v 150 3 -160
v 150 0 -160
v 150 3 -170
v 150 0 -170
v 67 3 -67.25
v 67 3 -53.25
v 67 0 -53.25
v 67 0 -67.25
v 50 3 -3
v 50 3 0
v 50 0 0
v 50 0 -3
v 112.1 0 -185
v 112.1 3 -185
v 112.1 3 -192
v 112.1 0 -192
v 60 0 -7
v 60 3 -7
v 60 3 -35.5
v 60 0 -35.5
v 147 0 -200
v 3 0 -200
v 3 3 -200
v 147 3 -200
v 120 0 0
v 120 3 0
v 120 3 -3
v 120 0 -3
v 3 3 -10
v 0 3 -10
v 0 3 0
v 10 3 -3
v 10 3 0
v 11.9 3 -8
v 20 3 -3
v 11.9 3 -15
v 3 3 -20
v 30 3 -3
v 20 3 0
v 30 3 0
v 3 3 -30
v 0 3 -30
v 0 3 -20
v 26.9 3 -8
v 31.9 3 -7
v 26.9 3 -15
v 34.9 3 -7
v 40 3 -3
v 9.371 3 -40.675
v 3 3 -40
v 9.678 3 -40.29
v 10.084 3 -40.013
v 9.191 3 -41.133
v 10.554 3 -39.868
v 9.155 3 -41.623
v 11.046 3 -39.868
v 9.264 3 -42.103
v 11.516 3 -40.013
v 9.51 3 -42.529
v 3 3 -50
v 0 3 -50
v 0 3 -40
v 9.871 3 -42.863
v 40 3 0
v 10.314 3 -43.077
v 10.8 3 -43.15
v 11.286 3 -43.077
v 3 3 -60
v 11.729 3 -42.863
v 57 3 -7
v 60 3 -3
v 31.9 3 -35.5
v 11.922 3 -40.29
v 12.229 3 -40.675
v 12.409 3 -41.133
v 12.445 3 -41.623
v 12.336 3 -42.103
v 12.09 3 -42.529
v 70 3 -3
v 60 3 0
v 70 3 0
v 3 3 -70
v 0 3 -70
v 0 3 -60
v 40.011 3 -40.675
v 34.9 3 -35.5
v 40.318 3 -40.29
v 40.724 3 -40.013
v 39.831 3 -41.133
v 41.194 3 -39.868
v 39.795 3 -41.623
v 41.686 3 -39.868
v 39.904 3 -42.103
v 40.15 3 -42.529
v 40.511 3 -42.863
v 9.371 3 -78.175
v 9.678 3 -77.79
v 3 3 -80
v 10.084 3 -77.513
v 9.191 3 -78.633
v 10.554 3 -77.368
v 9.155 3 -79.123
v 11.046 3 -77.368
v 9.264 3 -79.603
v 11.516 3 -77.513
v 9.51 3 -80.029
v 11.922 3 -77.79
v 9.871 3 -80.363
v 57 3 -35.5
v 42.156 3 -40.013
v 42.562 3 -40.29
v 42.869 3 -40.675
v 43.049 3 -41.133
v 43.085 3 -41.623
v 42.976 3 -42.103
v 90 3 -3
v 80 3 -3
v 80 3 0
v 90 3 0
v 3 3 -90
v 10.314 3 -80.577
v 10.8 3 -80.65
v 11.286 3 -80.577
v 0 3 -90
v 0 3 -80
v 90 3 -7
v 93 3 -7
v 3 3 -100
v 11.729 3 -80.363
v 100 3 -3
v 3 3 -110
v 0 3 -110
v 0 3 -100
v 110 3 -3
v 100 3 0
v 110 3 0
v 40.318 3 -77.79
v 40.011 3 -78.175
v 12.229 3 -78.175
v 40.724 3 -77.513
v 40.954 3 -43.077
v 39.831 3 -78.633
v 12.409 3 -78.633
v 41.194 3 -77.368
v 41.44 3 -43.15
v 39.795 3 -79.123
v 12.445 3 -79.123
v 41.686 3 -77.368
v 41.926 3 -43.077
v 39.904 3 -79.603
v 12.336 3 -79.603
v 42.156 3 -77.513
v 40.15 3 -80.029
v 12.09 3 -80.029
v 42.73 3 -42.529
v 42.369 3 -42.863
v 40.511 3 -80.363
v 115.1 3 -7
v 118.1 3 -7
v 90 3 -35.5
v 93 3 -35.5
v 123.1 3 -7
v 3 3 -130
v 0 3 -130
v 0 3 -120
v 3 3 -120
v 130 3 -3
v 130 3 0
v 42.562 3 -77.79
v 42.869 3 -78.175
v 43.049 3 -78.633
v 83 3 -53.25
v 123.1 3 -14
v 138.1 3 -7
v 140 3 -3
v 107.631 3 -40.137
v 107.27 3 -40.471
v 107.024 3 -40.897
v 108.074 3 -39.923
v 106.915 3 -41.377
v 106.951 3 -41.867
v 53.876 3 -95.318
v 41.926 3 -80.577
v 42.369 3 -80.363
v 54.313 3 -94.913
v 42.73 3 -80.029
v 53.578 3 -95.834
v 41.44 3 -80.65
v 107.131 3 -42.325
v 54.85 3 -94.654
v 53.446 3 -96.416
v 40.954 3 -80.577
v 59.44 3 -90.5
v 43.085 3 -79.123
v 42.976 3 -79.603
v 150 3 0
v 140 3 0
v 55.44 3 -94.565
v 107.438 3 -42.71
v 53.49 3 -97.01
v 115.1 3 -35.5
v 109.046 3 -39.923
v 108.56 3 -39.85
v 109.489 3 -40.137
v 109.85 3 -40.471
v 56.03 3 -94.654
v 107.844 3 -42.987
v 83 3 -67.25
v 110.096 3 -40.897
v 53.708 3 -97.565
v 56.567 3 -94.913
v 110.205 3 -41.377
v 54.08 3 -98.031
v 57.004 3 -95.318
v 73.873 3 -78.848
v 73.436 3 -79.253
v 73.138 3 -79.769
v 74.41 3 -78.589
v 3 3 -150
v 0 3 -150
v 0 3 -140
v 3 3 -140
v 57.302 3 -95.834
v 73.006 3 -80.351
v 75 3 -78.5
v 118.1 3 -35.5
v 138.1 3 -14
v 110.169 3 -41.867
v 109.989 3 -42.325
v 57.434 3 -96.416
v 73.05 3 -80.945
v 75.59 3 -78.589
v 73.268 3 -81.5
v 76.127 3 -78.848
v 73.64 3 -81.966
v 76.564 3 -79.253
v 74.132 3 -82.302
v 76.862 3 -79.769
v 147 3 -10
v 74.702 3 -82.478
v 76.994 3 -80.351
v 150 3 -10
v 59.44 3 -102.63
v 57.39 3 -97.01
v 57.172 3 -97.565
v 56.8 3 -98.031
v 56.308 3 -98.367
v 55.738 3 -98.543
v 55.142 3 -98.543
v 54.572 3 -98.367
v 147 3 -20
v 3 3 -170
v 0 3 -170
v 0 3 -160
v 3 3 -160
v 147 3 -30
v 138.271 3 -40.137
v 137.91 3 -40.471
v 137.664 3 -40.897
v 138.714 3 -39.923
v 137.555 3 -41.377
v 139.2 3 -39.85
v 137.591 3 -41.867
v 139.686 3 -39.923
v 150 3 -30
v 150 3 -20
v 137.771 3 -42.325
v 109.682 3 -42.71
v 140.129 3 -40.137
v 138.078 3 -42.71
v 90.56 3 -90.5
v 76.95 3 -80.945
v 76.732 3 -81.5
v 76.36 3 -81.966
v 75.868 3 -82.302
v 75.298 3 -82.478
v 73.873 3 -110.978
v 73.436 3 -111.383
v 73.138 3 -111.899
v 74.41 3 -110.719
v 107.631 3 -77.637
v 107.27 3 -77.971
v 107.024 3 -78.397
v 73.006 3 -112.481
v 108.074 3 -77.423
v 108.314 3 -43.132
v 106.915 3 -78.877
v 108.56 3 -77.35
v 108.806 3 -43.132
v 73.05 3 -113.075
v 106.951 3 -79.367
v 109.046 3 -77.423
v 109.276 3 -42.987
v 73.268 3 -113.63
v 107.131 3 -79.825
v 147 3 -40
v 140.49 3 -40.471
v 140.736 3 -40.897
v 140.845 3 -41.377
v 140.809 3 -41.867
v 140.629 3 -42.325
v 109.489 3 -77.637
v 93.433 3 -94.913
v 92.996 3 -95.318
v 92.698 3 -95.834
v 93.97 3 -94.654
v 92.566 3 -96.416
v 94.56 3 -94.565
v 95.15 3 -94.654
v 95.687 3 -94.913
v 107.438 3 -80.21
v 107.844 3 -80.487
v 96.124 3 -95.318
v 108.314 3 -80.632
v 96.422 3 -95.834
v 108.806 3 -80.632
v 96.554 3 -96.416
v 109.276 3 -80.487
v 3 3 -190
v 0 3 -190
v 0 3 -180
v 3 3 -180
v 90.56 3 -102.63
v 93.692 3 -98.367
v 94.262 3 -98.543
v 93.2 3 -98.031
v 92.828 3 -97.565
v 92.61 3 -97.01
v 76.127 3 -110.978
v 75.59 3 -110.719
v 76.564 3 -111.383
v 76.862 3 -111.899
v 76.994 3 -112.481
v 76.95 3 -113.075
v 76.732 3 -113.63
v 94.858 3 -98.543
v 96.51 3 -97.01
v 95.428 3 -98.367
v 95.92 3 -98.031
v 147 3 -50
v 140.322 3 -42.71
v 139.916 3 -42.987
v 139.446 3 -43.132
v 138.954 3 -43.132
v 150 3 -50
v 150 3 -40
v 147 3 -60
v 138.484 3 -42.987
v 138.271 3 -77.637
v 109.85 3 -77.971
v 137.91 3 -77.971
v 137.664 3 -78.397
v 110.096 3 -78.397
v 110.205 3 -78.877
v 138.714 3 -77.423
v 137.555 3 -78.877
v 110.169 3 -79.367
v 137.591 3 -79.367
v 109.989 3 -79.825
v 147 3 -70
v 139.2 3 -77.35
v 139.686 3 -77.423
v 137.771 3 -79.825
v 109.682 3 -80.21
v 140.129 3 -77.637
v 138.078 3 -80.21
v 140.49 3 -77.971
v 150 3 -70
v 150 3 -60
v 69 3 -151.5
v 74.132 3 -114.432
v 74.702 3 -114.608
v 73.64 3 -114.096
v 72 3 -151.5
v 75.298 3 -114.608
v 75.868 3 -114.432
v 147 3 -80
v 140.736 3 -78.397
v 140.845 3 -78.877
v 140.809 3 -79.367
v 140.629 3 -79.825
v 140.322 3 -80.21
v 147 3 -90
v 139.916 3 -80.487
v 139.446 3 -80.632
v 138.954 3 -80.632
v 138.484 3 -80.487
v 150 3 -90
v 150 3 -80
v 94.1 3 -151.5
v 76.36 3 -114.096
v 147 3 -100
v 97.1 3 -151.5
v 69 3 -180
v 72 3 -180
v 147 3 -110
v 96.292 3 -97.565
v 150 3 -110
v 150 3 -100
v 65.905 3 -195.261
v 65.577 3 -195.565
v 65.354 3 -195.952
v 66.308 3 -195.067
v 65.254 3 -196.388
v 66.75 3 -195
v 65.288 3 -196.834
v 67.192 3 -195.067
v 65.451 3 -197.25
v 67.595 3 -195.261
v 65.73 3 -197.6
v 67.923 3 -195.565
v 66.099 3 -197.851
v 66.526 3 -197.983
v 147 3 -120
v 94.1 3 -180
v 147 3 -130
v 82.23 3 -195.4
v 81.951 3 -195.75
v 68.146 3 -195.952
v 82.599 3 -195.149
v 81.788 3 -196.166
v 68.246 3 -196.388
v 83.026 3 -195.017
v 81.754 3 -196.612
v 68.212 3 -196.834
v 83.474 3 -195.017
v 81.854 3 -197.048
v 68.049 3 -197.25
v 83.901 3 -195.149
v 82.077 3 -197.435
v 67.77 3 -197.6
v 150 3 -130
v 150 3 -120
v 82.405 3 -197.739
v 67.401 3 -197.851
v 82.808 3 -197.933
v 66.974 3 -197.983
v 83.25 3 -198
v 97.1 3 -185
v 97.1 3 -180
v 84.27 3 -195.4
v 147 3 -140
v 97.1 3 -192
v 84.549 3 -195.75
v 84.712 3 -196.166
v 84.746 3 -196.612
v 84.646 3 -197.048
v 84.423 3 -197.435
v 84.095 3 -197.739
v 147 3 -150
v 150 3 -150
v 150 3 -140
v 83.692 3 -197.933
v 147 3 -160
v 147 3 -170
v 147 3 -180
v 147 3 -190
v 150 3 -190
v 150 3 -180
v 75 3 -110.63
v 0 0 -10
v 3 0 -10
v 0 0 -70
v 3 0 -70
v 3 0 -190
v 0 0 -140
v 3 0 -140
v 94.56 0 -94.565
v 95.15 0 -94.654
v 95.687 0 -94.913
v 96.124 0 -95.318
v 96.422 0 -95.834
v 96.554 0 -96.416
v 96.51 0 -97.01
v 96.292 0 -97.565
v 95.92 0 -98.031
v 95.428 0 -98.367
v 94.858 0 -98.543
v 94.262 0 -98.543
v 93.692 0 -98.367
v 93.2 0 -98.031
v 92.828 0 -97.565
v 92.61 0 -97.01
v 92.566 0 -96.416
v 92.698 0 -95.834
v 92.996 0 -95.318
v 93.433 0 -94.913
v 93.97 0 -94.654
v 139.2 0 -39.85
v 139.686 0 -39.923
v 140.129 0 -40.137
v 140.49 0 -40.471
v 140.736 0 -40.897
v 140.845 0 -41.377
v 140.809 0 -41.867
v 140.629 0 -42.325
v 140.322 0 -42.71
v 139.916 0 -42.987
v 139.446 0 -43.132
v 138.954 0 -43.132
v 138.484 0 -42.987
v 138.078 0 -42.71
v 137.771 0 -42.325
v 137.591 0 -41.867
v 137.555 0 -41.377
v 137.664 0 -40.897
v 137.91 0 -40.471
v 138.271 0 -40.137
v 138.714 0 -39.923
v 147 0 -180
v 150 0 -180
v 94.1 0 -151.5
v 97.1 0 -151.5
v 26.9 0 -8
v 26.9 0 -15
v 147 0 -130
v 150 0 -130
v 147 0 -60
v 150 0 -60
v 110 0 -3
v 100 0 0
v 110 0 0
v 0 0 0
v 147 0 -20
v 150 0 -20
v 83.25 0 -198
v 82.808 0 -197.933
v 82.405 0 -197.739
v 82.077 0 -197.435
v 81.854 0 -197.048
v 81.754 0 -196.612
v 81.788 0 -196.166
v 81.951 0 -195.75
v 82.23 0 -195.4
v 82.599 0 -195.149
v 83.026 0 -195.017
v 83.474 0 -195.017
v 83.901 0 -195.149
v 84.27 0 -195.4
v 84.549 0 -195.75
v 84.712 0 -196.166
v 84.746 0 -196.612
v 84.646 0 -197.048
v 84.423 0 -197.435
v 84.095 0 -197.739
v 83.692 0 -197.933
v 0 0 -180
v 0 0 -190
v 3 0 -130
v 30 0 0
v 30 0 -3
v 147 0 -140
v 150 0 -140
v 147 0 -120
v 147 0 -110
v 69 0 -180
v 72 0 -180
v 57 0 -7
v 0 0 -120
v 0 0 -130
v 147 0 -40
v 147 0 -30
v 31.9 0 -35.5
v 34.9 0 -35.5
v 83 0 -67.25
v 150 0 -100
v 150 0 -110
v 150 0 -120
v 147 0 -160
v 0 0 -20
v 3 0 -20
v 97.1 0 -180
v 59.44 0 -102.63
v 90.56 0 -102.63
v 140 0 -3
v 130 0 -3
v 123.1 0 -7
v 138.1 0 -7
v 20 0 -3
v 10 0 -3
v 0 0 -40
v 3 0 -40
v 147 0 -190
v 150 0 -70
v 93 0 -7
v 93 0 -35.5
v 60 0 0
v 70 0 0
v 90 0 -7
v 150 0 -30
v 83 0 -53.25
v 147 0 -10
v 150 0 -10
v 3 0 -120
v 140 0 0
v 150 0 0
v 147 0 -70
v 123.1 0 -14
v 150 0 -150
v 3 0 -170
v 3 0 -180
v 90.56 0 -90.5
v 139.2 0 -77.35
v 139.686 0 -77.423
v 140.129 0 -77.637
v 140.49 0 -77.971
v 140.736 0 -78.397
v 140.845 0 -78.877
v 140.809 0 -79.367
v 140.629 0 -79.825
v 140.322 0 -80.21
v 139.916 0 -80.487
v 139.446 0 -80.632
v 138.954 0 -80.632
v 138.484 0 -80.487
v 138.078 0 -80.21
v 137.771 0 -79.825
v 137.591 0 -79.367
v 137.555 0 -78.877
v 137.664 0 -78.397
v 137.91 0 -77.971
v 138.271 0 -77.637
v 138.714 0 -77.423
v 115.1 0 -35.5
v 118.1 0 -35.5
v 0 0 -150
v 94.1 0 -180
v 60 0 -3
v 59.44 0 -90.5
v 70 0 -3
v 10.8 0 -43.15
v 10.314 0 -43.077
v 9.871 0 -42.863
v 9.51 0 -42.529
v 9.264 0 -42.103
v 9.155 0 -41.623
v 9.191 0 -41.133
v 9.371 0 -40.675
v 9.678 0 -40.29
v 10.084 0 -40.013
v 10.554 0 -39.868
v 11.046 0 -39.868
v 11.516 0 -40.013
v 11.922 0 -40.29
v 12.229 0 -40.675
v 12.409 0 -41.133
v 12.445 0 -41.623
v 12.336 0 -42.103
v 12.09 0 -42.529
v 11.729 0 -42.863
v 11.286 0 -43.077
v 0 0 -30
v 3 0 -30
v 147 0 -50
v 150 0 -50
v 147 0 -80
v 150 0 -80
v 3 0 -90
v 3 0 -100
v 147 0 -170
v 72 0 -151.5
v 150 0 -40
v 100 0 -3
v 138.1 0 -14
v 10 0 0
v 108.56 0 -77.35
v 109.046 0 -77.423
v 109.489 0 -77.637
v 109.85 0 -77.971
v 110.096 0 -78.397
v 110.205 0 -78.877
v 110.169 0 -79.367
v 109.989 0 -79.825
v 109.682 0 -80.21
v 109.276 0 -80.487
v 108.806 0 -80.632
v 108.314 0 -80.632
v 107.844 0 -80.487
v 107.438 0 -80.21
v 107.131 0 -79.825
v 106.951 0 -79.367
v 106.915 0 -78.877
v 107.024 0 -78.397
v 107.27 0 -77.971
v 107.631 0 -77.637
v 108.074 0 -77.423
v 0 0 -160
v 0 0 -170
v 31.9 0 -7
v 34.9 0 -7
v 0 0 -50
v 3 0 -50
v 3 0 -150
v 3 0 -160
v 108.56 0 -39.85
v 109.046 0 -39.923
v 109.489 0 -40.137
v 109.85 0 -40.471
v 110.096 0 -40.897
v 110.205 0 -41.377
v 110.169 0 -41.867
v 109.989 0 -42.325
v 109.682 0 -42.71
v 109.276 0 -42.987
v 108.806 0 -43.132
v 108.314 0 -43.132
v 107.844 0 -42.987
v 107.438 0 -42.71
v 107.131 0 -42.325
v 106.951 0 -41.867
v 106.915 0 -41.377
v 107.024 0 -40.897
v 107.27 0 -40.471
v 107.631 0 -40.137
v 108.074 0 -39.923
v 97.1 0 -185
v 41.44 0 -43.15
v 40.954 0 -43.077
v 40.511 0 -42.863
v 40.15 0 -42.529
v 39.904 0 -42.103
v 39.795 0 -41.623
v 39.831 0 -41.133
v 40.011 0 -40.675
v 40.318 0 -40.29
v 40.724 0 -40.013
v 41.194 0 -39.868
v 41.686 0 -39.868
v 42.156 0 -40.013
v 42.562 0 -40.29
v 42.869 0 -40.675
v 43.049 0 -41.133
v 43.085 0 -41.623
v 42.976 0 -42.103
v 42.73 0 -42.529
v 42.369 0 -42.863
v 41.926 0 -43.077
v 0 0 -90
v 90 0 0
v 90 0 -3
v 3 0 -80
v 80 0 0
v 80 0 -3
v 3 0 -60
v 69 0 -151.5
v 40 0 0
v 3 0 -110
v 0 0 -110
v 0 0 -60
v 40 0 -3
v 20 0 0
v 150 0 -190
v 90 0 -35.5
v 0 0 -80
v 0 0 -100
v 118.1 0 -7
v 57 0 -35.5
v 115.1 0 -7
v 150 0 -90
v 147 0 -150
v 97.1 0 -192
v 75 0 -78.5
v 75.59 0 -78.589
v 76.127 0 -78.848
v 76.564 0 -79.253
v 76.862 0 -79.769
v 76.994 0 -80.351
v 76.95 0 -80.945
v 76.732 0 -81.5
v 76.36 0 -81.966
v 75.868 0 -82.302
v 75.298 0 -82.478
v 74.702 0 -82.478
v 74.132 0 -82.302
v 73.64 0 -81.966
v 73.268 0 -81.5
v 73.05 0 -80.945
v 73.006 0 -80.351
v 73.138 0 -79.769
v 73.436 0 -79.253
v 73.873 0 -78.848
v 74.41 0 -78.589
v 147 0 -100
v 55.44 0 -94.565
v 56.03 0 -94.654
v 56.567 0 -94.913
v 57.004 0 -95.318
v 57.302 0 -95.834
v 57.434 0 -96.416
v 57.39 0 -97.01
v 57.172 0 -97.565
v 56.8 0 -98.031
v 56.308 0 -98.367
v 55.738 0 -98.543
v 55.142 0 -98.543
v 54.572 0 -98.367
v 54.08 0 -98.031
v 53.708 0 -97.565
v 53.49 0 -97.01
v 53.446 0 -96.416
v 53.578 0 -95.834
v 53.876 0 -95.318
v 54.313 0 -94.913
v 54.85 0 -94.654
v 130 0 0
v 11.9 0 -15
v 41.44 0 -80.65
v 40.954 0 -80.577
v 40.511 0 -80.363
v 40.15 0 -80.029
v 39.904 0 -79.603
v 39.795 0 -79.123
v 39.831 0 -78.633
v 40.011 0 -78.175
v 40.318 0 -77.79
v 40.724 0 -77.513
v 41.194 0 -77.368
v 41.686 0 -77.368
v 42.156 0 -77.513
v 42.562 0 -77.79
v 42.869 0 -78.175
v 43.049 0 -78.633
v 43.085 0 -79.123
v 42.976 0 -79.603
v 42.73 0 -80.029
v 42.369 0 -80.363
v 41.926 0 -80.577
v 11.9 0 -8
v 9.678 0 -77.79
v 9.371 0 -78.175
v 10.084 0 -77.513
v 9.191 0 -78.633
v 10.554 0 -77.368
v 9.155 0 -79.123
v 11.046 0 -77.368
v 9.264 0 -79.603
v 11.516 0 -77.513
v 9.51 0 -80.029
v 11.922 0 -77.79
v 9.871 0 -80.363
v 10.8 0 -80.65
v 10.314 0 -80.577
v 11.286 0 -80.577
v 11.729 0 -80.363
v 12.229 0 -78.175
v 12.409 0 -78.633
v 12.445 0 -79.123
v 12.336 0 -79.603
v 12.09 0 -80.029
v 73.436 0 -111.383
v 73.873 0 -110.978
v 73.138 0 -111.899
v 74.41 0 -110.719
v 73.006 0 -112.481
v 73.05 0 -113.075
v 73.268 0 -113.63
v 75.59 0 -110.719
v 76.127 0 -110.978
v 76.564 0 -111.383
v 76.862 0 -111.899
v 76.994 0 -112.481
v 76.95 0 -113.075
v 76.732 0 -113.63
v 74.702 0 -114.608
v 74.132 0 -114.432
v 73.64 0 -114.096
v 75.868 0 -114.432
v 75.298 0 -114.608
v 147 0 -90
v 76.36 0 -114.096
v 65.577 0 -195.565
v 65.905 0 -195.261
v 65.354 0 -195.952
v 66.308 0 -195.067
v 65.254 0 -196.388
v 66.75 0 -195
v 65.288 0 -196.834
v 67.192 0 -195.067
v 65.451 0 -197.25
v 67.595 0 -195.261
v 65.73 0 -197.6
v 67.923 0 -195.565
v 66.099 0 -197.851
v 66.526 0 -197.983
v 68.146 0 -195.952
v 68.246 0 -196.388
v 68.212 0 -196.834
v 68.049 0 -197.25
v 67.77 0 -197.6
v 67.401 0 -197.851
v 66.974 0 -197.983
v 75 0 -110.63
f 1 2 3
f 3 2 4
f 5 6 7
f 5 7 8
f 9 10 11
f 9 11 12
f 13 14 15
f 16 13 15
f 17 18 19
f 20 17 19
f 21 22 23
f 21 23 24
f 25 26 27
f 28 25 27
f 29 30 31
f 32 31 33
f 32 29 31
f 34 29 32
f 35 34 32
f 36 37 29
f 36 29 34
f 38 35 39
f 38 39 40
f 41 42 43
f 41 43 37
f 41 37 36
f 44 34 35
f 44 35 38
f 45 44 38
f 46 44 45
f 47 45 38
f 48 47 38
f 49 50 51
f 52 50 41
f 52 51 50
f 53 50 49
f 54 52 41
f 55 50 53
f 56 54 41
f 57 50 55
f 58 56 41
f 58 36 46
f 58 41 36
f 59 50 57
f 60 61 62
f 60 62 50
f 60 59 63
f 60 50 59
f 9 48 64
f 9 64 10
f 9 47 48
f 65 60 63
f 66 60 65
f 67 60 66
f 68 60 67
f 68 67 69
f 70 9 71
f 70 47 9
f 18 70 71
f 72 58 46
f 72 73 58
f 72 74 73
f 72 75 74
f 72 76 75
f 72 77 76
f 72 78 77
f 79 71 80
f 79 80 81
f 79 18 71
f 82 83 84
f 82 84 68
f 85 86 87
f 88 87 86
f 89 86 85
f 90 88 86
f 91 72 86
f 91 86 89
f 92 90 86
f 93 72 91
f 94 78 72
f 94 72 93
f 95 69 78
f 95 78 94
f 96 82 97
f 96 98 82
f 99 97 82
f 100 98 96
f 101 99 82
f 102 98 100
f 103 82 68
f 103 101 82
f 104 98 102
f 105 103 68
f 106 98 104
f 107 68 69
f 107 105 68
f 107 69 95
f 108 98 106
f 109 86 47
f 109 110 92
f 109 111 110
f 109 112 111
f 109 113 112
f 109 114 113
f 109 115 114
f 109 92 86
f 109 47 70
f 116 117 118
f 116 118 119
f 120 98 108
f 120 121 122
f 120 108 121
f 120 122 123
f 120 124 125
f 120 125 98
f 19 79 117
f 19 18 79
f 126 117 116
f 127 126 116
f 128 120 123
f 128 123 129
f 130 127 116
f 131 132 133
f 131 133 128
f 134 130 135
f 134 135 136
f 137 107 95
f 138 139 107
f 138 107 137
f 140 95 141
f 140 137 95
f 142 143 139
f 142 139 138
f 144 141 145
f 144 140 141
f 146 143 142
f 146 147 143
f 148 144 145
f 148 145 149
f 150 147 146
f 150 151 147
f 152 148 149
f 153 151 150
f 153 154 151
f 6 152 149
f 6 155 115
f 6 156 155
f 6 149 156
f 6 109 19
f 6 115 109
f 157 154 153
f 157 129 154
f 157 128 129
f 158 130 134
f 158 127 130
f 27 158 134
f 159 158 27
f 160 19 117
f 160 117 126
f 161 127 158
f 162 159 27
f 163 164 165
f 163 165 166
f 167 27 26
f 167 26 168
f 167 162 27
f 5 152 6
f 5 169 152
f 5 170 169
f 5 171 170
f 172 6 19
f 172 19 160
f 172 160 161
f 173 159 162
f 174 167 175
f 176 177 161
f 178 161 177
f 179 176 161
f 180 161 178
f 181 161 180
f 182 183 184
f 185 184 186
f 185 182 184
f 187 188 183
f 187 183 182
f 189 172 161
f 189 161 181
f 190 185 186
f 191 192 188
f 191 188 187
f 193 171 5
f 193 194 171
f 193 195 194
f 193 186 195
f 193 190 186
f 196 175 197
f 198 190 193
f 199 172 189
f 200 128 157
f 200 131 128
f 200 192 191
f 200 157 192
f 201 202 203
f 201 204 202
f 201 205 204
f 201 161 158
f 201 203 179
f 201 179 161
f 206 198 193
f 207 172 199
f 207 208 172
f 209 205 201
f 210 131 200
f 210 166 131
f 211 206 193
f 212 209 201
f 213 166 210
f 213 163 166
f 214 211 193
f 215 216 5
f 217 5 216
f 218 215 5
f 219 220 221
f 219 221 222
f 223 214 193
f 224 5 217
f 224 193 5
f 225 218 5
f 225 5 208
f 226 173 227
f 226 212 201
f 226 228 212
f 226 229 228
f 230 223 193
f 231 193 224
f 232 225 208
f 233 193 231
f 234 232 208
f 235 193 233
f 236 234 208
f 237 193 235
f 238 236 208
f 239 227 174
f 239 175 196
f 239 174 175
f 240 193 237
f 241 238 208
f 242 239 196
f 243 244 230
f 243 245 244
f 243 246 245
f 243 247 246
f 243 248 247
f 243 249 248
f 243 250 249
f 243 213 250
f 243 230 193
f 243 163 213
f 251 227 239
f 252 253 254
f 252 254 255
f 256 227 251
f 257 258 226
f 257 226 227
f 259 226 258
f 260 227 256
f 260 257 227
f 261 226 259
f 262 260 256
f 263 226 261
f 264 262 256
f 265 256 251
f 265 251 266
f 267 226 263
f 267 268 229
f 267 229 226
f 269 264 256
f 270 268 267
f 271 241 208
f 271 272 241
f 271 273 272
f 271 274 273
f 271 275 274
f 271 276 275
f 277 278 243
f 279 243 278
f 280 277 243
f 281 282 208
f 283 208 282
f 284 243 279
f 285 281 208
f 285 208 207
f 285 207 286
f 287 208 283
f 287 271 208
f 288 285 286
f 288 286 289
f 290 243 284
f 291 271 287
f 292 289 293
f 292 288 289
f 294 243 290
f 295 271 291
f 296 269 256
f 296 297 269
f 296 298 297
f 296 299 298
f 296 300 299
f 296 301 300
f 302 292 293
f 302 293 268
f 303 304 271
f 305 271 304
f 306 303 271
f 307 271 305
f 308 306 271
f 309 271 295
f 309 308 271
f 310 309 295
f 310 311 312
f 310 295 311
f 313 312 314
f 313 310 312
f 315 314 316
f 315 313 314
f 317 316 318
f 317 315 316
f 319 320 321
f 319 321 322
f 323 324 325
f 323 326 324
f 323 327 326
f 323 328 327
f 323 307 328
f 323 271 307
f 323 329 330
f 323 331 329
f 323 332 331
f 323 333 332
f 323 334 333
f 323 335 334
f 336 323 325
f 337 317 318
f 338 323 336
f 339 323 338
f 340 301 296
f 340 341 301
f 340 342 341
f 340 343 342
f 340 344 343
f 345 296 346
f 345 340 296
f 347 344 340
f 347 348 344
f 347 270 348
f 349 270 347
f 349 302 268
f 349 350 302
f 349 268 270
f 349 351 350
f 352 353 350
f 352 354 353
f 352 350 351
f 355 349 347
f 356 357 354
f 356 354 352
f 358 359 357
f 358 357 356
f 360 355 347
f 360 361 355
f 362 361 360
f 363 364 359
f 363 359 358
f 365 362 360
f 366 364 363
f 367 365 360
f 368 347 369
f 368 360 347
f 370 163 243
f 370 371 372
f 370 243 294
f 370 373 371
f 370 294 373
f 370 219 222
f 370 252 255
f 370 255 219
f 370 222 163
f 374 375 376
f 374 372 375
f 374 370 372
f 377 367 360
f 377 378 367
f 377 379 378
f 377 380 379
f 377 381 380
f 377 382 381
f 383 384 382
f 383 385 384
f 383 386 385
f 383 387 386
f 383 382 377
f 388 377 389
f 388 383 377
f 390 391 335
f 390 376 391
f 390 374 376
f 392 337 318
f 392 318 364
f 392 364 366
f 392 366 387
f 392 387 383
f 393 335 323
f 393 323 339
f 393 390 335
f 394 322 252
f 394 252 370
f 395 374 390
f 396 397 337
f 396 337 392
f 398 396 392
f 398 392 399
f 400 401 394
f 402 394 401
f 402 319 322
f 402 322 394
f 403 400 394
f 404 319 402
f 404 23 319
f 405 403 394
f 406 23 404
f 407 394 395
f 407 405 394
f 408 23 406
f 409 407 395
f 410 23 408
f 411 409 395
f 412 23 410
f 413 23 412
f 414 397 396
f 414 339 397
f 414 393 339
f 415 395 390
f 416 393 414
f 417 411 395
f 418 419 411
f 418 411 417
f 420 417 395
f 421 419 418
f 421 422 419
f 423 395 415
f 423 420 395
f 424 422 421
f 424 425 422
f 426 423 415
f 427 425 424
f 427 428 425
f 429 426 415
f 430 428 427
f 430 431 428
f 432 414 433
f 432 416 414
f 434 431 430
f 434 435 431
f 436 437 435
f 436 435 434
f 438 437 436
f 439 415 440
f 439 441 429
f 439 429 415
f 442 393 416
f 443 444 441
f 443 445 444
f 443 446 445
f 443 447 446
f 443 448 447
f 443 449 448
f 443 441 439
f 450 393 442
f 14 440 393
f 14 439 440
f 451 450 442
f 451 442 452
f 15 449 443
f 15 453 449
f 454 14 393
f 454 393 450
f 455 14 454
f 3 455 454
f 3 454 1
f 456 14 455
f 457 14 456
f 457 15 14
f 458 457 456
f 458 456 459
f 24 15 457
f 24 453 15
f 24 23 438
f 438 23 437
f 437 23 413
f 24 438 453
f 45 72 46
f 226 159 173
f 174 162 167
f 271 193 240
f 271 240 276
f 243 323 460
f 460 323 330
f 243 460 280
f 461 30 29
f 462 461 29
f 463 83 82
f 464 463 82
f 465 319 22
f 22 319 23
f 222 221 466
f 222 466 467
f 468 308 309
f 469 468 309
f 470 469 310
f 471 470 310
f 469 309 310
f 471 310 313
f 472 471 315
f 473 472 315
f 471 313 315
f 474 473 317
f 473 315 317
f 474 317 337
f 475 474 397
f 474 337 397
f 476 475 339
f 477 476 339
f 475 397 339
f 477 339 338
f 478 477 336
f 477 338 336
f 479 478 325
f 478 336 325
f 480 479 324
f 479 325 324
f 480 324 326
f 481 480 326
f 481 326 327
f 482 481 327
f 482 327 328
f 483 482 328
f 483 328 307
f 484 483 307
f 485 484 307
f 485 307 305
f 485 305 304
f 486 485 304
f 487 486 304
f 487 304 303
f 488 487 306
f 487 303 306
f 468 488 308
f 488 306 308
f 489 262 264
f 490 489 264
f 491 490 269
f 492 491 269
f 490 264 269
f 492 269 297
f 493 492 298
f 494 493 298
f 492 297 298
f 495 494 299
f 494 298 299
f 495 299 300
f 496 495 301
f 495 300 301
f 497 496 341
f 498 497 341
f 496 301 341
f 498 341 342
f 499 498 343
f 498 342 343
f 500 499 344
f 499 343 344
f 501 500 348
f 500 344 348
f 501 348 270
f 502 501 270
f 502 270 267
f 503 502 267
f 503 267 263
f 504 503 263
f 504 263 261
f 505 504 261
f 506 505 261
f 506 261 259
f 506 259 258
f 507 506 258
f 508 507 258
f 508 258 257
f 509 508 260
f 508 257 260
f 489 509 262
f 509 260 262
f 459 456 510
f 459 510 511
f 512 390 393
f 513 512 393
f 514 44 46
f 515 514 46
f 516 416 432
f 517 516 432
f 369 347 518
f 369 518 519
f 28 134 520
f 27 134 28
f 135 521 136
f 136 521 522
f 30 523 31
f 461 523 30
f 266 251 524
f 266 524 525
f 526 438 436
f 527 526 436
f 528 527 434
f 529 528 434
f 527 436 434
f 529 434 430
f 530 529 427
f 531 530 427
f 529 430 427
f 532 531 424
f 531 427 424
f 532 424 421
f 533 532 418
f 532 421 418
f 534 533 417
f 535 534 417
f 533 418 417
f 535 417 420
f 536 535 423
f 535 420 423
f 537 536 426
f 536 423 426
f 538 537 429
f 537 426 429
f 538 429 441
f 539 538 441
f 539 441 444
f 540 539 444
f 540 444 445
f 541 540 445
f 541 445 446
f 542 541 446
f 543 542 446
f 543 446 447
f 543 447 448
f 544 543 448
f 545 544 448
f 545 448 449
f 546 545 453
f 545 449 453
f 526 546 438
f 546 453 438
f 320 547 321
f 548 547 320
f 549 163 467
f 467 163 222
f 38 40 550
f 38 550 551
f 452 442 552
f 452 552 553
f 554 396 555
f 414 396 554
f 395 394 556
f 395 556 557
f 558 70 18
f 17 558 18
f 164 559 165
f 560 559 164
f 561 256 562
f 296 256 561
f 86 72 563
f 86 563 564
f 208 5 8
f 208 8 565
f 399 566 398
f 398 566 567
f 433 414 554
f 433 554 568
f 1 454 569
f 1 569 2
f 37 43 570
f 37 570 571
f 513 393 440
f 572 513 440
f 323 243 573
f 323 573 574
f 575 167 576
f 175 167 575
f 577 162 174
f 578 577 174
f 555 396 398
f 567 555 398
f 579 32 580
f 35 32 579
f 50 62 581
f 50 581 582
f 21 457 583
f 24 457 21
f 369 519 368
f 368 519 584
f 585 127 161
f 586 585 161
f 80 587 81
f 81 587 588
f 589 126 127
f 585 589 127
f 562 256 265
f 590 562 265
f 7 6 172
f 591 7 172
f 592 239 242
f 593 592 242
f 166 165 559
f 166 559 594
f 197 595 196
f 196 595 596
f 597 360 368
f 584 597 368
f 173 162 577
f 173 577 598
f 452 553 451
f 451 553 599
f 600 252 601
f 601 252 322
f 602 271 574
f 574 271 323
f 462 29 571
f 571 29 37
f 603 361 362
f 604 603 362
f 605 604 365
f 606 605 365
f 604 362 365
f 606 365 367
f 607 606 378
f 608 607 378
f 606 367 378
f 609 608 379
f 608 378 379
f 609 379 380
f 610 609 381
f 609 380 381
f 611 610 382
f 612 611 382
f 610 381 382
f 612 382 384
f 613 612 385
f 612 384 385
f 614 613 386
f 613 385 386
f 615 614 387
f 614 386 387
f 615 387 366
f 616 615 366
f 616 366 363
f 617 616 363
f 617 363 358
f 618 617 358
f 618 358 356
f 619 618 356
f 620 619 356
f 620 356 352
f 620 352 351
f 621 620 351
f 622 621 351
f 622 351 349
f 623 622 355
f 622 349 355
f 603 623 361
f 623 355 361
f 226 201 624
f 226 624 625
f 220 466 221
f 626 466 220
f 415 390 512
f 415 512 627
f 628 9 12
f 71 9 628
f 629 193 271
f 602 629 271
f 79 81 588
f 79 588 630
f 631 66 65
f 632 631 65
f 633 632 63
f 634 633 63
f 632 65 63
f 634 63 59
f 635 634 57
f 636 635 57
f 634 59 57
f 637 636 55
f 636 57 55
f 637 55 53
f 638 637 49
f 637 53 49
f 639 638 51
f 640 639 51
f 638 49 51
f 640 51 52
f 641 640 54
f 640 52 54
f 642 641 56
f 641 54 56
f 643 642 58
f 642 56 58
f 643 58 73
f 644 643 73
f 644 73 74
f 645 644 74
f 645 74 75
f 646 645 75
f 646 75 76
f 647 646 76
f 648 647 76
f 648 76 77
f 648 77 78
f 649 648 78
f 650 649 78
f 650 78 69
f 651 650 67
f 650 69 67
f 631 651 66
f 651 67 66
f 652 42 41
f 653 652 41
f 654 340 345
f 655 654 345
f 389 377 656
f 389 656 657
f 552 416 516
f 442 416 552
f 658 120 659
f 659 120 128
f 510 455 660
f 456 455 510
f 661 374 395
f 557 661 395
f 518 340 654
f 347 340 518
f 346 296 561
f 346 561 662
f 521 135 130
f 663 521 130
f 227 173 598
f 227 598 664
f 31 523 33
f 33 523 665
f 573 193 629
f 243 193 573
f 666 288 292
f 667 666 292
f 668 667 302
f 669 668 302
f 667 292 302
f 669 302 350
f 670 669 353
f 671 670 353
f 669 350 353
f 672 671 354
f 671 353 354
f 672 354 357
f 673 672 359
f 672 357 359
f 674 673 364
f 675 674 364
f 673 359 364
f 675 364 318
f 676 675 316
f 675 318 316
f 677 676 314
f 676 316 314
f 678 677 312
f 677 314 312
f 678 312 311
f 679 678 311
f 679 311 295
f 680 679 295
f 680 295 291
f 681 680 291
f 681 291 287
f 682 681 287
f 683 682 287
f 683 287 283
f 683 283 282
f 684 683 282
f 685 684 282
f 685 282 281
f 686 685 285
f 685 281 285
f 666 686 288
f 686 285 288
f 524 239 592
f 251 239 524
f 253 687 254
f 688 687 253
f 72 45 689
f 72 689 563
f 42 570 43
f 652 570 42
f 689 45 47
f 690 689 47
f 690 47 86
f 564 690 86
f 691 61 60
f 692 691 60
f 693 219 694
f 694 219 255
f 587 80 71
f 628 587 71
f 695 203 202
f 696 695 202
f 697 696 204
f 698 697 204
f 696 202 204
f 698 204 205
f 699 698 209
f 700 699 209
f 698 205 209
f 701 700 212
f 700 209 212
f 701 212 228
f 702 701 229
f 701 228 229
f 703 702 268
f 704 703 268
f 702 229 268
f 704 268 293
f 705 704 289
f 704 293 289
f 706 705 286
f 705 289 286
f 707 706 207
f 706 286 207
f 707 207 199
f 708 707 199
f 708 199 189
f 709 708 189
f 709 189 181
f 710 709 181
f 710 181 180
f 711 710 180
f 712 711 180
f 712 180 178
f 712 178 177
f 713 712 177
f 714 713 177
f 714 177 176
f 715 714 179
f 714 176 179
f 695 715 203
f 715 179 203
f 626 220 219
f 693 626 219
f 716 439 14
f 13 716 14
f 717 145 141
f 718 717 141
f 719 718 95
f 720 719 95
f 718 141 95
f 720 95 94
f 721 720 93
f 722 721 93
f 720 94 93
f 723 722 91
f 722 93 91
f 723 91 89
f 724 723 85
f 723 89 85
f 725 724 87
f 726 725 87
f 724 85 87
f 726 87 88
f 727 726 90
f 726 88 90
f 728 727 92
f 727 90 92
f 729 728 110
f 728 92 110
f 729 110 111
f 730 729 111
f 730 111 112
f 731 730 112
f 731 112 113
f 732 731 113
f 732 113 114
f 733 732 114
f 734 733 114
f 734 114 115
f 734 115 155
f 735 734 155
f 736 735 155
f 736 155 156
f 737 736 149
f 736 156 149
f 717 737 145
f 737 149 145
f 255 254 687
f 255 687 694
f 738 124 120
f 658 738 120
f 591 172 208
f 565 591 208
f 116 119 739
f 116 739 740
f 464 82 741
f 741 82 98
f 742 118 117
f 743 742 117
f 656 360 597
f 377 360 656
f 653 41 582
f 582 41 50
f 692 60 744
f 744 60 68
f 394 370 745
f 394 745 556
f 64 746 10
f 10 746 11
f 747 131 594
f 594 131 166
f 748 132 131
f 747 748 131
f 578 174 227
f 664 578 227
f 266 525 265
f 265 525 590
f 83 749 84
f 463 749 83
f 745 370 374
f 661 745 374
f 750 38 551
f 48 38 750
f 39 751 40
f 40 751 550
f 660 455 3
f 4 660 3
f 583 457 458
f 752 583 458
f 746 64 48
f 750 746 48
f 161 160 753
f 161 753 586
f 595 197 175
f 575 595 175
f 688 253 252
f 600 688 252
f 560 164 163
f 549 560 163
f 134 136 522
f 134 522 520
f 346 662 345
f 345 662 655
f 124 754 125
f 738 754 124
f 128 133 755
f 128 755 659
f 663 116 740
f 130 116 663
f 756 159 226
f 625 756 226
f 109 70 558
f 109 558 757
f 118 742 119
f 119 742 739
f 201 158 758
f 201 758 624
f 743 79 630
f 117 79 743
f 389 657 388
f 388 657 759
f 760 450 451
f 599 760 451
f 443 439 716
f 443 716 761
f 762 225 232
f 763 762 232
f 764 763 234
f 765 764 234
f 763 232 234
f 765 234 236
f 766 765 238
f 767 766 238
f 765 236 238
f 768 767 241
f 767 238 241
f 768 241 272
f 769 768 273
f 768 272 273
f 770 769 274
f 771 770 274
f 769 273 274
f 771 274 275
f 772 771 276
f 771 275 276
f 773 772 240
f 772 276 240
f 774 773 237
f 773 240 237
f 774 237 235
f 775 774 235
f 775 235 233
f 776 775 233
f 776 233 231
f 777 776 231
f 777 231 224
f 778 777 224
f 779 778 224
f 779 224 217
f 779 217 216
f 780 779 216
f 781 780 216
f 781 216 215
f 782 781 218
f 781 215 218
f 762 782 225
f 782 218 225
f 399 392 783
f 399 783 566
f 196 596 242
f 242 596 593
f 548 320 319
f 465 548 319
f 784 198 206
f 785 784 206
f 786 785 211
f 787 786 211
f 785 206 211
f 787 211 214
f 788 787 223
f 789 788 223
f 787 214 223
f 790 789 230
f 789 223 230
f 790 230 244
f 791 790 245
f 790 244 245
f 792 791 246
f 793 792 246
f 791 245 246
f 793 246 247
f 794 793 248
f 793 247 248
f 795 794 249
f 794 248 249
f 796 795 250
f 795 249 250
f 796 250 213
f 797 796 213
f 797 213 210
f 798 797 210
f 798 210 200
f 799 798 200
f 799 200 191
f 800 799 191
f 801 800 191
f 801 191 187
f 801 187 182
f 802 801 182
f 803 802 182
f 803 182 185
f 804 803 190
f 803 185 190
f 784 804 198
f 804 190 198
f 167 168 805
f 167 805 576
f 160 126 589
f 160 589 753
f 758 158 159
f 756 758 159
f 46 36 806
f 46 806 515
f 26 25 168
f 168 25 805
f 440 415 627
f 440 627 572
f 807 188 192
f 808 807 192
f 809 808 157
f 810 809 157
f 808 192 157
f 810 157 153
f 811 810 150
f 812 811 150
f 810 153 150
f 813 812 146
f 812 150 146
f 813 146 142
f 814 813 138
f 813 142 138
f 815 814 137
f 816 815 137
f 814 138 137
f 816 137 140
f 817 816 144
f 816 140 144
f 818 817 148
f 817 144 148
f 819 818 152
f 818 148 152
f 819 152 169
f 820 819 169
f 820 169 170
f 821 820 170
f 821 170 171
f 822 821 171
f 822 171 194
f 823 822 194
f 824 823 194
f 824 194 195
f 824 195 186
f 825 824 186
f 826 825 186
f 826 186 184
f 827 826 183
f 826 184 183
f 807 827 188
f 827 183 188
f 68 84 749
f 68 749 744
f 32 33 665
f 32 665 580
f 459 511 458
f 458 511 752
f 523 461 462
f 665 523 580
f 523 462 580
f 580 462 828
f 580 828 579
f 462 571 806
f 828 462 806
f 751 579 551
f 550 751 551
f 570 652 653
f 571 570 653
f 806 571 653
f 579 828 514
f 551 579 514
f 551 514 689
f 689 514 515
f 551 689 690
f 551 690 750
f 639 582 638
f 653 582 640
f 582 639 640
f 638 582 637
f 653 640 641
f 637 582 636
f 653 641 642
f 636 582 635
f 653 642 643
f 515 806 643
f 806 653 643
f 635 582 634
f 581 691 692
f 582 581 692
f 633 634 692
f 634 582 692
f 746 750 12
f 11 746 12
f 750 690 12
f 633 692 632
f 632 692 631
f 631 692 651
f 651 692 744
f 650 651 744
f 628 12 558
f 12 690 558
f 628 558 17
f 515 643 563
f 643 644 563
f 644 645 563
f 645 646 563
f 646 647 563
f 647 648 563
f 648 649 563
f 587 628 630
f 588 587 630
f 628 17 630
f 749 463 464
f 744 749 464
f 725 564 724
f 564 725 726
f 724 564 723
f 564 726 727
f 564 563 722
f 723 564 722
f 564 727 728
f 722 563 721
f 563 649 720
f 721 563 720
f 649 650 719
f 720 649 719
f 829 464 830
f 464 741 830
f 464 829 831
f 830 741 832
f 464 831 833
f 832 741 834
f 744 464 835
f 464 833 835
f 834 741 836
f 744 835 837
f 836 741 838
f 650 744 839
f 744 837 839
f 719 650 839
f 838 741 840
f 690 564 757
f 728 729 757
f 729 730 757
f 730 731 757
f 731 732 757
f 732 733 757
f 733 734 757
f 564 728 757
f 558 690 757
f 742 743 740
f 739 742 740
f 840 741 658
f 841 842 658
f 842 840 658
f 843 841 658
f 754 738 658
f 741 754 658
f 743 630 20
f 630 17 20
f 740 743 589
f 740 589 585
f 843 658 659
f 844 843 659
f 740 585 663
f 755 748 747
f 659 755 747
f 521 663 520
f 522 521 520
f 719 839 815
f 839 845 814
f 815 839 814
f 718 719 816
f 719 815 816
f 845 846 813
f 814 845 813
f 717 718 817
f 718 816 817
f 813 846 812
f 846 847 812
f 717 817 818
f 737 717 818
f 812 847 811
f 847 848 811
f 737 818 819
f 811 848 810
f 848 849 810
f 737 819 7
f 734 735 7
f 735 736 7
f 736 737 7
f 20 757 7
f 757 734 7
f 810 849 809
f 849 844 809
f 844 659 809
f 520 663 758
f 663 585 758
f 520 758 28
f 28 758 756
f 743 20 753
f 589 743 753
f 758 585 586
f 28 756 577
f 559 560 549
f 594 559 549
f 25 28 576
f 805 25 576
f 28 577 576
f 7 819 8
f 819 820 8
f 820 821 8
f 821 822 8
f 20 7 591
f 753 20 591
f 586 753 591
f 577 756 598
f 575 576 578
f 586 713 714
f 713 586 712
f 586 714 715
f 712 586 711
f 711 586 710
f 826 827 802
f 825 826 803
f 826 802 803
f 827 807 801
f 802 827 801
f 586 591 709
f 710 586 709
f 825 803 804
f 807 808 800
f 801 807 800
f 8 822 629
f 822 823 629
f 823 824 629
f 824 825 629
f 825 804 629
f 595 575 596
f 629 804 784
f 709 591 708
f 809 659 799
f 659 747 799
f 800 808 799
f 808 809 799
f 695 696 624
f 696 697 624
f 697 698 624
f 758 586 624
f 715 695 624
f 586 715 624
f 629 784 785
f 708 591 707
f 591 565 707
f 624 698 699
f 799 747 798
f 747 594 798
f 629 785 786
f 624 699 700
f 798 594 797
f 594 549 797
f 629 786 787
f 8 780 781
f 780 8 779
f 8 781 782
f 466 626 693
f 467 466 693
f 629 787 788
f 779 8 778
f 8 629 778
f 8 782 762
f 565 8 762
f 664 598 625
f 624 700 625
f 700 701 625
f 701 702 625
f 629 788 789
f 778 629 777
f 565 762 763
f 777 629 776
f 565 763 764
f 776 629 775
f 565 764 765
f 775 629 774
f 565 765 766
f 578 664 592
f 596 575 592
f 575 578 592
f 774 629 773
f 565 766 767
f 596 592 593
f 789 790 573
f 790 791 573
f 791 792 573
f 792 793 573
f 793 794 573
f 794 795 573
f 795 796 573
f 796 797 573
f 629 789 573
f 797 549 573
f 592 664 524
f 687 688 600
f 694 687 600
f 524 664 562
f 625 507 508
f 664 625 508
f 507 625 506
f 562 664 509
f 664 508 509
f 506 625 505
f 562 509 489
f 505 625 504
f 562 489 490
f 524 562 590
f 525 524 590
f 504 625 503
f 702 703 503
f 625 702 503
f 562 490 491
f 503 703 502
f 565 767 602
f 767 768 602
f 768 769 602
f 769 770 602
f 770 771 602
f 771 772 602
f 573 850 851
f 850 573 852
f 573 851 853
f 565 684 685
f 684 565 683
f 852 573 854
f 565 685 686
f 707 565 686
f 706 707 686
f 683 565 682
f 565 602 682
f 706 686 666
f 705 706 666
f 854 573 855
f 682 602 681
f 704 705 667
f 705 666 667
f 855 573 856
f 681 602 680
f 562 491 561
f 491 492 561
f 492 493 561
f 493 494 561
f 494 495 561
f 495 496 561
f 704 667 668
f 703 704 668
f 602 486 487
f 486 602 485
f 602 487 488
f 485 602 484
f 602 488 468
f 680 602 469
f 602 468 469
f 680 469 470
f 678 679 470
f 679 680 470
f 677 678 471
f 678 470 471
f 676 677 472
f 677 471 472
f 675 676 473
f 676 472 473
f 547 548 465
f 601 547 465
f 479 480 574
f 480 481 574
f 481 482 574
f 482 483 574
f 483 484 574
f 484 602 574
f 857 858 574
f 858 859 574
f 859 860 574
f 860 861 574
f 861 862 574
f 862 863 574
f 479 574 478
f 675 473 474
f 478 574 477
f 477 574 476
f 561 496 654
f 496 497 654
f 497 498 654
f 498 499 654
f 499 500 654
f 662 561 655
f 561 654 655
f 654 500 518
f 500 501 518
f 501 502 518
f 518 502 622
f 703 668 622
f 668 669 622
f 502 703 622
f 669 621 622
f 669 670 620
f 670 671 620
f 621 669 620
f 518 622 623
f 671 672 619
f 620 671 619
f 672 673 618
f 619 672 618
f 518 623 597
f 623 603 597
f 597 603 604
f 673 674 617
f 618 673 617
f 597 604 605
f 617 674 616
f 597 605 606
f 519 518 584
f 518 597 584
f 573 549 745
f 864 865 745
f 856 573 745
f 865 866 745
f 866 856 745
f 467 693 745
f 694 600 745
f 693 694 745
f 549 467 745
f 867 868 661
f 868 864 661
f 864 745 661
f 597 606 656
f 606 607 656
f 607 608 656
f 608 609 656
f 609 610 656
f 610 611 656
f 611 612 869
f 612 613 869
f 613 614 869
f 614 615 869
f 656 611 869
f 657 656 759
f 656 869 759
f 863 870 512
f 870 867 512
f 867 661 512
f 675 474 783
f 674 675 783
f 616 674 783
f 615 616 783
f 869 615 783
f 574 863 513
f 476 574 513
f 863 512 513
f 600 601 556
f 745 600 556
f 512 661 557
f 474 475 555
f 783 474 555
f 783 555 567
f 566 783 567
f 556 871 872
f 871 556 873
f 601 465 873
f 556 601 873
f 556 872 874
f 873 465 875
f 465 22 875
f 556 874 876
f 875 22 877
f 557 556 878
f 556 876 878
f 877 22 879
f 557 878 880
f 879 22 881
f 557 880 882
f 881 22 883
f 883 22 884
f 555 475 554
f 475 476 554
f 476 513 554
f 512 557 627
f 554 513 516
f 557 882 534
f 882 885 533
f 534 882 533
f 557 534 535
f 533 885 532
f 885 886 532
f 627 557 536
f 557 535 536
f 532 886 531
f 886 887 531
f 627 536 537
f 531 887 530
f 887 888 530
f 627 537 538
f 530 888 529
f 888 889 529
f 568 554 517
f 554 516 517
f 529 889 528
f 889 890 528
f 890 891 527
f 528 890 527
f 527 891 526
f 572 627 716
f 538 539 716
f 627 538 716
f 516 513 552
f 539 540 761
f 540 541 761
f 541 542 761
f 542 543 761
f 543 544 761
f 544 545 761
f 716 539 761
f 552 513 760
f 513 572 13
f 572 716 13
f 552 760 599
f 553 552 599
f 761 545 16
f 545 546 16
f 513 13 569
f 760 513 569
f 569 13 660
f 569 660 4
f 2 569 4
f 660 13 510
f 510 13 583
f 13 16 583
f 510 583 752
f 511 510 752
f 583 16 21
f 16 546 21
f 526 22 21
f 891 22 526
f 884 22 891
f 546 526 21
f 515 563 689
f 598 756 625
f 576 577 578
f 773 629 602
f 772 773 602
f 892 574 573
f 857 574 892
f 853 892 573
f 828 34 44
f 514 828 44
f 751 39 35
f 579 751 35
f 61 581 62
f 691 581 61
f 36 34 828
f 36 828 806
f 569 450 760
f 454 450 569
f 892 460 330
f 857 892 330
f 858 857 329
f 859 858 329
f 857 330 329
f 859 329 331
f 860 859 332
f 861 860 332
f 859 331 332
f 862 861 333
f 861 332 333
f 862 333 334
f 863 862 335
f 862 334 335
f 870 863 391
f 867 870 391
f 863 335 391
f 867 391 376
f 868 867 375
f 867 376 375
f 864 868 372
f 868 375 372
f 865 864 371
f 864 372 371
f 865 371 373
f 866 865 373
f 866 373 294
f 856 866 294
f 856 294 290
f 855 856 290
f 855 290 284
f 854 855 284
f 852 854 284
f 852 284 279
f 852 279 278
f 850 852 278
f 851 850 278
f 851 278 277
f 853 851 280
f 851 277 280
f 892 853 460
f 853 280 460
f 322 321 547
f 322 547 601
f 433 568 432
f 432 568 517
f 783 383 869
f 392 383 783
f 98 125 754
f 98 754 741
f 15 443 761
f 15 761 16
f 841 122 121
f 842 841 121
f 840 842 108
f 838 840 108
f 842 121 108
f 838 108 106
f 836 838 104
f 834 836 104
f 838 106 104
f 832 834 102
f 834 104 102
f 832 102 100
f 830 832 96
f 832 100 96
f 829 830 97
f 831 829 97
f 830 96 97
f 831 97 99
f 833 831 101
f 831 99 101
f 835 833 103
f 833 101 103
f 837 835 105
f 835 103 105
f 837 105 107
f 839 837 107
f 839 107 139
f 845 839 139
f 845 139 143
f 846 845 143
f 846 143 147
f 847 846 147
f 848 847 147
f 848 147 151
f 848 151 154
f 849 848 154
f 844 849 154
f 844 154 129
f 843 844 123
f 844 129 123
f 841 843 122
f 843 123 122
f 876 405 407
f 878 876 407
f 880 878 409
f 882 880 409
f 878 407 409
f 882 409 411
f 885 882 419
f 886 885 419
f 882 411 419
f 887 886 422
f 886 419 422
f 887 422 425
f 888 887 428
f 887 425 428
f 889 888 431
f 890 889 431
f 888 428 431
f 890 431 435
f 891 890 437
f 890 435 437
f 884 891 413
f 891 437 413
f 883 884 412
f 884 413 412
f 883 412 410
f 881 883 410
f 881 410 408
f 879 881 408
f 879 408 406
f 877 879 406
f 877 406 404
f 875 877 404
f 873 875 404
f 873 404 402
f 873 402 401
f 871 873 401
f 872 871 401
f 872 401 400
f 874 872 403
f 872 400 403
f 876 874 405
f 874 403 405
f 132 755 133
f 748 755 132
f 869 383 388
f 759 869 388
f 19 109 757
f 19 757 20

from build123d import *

# Parameters (mm, degrees)
MDFESB_W          = 150
MDFESB_H          = 200
MDF_DEPTH         = 3
LDRESB_W          = 3
LDRESB_H          = 28.5
LDRESB_W_2        = 15
LDRESB_H_2        = 7
LDRBURACOS_DEPTH  = 3
CORESB_R          = 2
CORESB_W          = 31.12
CORESB_H          = 12.13
CORBURACOS_DEPTH  = 3
ENCAIXESESB_W     = 10
ENCAIXESESB_H     = 3
ENCAIXESESB_W_2   = 3
ENCAIXESESB_H_2   = 10
ENCAIXE_DEPTH     = 3
ACOPLMOTORESB_R   = 1.65
ACOPLMOTORESB_W   = 16
ACOPLMOTORESB_H   = 14
ACOPLMOTOR_DEPTH  = 3
CASTERFUROSESB_R  = 1.5
CASTERFUROS_DEPTH = 3


with BuildPart() as part:
    # mdfEsb → mdf (new body)
    with BuildSketch(Plane(origin=(0, 0, 0), x_dir=(1, 0, 0), z_dir=(0, 1, 0))):
        with Locations((75, 100)):
            Rectangle(MDFESB_W, MDFESB_H)
    extrude(amount=MDF_DEPTH)

    # ldrEsb → ldrBuracos (cut)
    with BuildSketch(Plane(origin=(0, 3, 0), x_dir=(1, 0, 0), z_dir=(0, 1, 0))):
        with Locations((33.4, 21.25)):
            Rectangle(LDRESB_W, LDRESB_H)
        with Locations((58.5, 21.25)):
            Rectangle(LDRESB_W, LDRESB_H)
        with Locations((91.5, 21.25)):
            Rectangle(LDRESB_W, LDRESB_H)
        with Locations((116.6, 21.25)):
            Rectangle(LDRESB_W, LDRESB_H)
        with Locations((70.5, 165.75)):
            Rectangle(LDRESB_W, LDRESB_H)
        with Locations((95.6, 165.75)):
            Rectangle(LDRESB_W, LDRESB_H)
        with Locations((130.6, 10.5)):
            Rectangle(LDRESB_W_2, LDRESB_H_2)
        with Locations((19.4, 11.5)):
            Rectangle(LDRESB_W_2, LDRESB_H_2)
        with Locations((104.6, 188.5)):
            Rectangle(LDRESB_W_2, LDRESB_H_2)
    extrude(amount=-LDRBURACOS_DEPTH, mode=Mode.SUBTRACT)

    # corEsb → corBuracos (cut)
    with BuildSketch(Plane(origin=(0, 3, 0), x_dir=(1, 0, 0), z_dir=(0, 1, 0))):
        with Locations(Location((75, 112.63, 0), (0, 0, 270))):
            Circle(CORESB_R)
        with Locations(Location((75, 80.5, 0), (0, 0, 270))):
            Circle(CORESB_R)
        with Locations(Location((94.56, 96.565, 0), (0, 0, 270))):
            Circle(CORESB_R)
        with Locations(Location((55.44, 96.565, 0), (0, 0, 270))):
            Circle(CORESB_R)
        with Locations((75, 96.565)):
            Rectangle(CORESB_W, CORESB_H)
    extrude(amount=-CORBURACOS_DEPTH, mode=Mode.SUBTRACT)

    # EncaixesEsb → Encaixe (cut)
    with BuildSketch(Plane(origin=(0, 3, 0), x_dir=(1, 0, 0), z_dir=(0, 1, 0))):
        with Locations((15, 1.5)):
            Rectangle(ENCAIXESESB_W, ENCAIXESESB_H)
        with Locations((1.5, 35)):
            Rectangle(ENCAIXESESB_W_2, ENCAIXESESB_H_2)
        with Locations((1.5, 15)):
            Rectangle(ENCAIXESESB_W_2, ENCAIXESESB_H_2)
        with Locations((1.5, 55)):
            Rectangle(ENCAIXESESB_W_2, ENCAIXESESB_H_2)
        with Locations((1.5, 75)):
            Rectangle(ENCAIXESESB_W_2, ENCAIXESESB_H_2)
        with Locations((1.5, 95)):
            Rectangle(ENCAIXESESB_W_2, ENCAIXESESB_H_2)
        with Locations((1.5, 115)):
            Rectangle(ENCAIXESESB_W_2, ENCAIXESESB_H_2)
        with Locations((1.5, 135)):
            Rectangle(ENCAIXESESB_W_2, ENCAIXESESB_H_2)
        with Locations((1.5, 155)):
            Rectangle(ENCAIXESESB_W_2, ENCAIXESESB_H_2)
        with Locations((1.5, 175)):
            Rectangle(ENCAIXESESB_W_2, ENCAIXESESB_H_2)
        with Locations((1.5, 195)):
            Rectangle(ENCAIXESESB_W_2, ENCAIXESESB_H_2)
        with Locations((35, 1.5)):
            Rectangle(ENCAIXESESB_W, ENCAIXESESB_H)
        with Locations((55, 1.5)):
            Rectangle(ENCAIXESESB_W, ENCAIXESESB_H)
        with Locations((75, 1.5)):
            Rectangle(ENCAIXESESB_W, ENCAIXESESB_H)
        with Locations((95, 1.5)):
            Rectangle(ENCAIXESESB_W, ENCAIXESESB_H)
        with Locations((115, 1.5)):
            Rectangle(ENCAIXESESB_W, ENCAIXESESB_H)
        with Locations((135, 1.5)):
            Rectangle(ENCAIXESESB_W, ENCAIXESESB_H)
        with Locations((148.5, 35)):
            Rectangle(ENCAIXESESB_W_2, ENCAIXESESB_H_2)
        with Locations((148.5, 15)):
            Rectangle(ENCAIXESESB_W_2, ENCAIXESESB_H_2)
        with Locations((148.5, 55)):
            Rectangle(ENCAIXESESB_W_2, ENCAIXESESB_H_2)
        with Locations((148.5, 75)):
            Rectangle(ENCAIXESESB_W_2, ENCAIXESESB_H_2)
        with Locations((148.5, 95)):
            Rectangle(ENCAIXESESB_W_2, ENCAIXESESB_H_2)
        with Locations((148.5, 115)):
            Rectangle(ENCAIXESESB_W_2, ENCAIXESESB_H_2)
        with Locations((148.5, 135)):
            Rectangle(ENCAIXESESB_W_2, ENCAIXESESB_H_2)
        with Locations((148.5, 155)):
            Rectangle(ENCAIXESESB_W_2, ENCAIXESESB_H_2)
        with Locations((148.5, 175)):
            Rectangle(ENCAIXESESB_W_2, ENCAIXESESB_H_2)
        with Locations((148.5, 195)):
            Rectangle(ENCAIXESESB_W_2, ENCAIXESESB_H_2)
    extrude(amount=-ENCAIXE_DEPTH, mode=Mode.SUBTRACT)

    # AcoplMotorEsb → AcoplMotor (cut)
    with BuildSketch(Plane(origin=(0, 3, 0), x_dir=(1, 0, 0), z_dir=(0, 1, 0))):
        with Locations(Location((108.56, 41.5, 0), (0, 0, 270))):
            Circle(ACOPLMOTORESB_R)
        with Locations(Location((108.56, 79, 0), (0, 0, 270))):
            Circle(ACOPLMOTORESB_R)
        with Locations(Location((139.2, 41.5, 0), (0, 0, 270))):
            Circle(ACOPLMOTORESB_R)
        with Locations(Location((139.2, 79, 0), (0, 0, 270))):
            Circle(ACOPLMOTORESB_R)
        with Locations(Location((10.8, 79, 0), (0, 0, 90))):
            Circle(ACOPLMOTORESB_R)
        with Locations(Location((10.8, 41.5, 0), (0, 0, 90))):
            Circle(ACOPLMOTORESB_R)
        with Locations(Location((41.44, 79, 0), (0, 0, 90))):
            Circle(ACOPLMOTORESB_R)
        with Locations(Location((41.44, 41.5, 0), (0, 0, 90))):
            Circle(ACOPLMOTORESB_R)
        with Locations((75, 60.25)):
            Rectangle(ACOPLMOTORESB_W, ACOPLMOTORESB_H)
    extrude(amount=-ACOPLMOTOR_DEPTH, mode=Mode.SUBTRACT)

    # CasterFurosEsb → CasterFuros (cut)
    with BuildSketch(Plane(origin=(0, 3, 0), x_dir=(1, 0, 0), z_dir=(0, 1, 0))):
        with Locations(Location((66.75, 196.5, 0), (0, 0, 270))):
            Circle(CASTERFUROSESB_R)
        with Locations(Location((83.25, 196.5, 0), (0, 0, 90))):
            Circle(CASTERFUROSESB_R)
    extrude(amount=-CASTERFUROS_DEPTH, mode=Mode.SUBTRACT)


solid = part.part
